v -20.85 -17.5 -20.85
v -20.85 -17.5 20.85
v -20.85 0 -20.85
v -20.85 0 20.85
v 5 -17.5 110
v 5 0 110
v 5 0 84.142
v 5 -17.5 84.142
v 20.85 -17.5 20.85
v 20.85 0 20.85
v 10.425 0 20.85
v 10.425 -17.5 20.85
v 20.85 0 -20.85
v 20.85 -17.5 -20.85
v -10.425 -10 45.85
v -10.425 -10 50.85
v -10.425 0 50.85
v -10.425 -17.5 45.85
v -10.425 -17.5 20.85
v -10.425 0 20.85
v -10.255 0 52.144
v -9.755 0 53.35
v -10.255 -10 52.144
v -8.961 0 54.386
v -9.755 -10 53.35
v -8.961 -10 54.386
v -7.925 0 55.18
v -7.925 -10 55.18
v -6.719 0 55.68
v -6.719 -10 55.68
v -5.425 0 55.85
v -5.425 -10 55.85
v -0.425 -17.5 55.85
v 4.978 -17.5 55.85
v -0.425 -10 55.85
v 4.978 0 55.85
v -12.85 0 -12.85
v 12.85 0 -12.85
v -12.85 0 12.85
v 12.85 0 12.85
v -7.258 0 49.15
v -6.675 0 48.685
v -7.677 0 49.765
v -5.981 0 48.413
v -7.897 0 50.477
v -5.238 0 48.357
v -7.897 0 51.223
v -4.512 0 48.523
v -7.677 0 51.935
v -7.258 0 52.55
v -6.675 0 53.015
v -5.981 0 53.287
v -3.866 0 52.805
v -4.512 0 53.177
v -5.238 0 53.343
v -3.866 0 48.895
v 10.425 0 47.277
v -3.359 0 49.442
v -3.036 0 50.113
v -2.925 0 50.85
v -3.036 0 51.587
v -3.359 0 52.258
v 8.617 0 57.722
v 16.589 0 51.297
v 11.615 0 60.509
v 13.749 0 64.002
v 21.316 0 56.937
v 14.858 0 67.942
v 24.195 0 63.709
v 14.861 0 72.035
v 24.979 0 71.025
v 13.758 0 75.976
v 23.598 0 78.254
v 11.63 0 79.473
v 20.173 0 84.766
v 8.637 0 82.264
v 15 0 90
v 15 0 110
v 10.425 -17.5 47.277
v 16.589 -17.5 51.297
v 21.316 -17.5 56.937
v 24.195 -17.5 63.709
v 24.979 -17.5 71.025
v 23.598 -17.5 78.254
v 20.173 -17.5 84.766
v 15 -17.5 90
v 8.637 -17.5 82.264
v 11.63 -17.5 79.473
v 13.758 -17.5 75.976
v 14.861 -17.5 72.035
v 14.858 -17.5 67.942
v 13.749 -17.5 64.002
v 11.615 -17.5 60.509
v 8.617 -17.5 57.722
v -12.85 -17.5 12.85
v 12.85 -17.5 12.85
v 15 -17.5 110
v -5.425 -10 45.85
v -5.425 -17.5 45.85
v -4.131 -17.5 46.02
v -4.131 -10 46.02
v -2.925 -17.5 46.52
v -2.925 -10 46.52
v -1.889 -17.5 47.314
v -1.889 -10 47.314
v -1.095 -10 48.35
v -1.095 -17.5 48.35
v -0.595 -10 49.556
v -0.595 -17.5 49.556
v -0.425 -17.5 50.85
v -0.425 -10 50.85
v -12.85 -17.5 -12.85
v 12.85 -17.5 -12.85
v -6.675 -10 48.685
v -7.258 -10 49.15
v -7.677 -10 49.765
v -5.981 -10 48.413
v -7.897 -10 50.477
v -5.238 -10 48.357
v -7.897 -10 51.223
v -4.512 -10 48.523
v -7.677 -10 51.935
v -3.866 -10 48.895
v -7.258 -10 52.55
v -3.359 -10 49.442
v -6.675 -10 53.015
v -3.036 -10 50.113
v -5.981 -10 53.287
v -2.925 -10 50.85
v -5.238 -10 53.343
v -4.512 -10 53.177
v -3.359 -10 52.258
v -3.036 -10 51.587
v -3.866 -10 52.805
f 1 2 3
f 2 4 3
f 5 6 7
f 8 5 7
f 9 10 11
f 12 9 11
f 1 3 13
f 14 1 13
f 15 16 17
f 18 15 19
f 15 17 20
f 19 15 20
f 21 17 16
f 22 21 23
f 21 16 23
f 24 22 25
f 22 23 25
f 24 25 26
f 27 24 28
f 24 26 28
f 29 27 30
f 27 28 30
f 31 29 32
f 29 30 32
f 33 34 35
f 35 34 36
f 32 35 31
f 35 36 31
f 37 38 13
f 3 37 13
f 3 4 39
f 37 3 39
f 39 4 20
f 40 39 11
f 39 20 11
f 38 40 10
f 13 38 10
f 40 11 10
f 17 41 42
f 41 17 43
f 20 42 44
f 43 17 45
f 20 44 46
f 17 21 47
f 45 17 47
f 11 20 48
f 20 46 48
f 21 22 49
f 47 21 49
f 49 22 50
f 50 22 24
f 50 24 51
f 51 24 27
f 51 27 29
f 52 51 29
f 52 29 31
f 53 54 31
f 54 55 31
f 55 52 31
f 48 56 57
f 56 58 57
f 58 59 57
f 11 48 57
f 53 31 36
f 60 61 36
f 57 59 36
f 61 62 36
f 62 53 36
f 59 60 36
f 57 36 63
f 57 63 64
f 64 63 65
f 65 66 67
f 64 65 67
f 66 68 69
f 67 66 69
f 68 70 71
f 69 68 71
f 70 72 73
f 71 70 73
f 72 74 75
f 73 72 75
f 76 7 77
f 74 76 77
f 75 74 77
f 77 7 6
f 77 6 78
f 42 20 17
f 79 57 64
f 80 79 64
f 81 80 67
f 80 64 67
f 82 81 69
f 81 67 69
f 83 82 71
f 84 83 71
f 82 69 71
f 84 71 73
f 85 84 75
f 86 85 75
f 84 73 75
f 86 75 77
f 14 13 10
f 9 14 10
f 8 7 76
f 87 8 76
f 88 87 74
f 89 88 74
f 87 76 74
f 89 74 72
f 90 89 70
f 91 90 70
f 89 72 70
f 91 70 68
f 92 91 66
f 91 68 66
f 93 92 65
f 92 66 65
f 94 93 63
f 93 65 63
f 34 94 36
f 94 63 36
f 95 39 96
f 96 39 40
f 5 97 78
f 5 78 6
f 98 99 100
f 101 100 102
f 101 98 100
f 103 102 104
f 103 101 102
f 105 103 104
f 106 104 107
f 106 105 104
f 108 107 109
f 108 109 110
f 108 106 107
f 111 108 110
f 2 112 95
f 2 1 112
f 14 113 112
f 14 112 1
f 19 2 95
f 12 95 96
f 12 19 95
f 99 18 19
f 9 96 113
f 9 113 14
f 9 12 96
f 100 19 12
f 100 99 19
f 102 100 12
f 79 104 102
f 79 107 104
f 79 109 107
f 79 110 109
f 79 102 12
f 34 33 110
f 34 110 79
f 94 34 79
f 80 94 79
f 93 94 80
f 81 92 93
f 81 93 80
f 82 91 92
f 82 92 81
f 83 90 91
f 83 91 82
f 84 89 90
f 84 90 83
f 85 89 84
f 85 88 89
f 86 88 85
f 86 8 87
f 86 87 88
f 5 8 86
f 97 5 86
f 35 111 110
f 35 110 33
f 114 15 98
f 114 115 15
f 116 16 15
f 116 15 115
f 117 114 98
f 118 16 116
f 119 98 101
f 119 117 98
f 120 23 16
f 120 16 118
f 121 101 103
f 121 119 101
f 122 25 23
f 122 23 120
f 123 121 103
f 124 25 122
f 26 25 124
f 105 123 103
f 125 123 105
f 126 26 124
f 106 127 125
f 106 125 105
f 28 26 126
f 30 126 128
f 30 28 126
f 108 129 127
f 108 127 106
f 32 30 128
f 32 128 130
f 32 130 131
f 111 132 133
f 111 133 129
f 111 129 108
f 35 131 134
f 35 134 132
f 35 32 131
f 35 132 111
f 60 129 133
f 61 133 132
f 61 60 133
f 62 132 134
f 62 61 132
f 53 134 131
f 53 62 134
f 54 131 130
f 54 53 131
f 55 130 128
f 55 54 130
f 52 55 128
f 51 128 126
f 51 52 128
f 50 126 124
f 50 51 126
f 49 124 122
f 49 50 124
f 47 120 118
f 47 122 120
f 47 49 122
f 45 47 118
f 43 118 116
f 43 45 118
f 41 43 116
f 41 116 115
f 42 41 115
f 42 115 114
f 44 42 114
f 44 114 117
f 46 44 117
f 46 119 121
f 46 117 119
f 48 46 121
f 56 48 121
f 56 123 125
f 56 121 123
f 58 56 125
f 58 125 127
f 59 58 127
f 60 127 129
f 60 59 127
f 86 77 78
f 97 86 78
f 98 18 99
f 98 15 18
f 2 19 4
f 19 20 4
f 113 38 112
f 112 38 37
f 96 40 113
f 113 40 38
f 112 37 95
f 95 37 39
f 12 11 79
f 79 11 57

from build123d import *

# Parameters (mm, degrees)
F0_R     = 2.5
F1_DEPTH = 15
F2_R     = 5
F4_DEPTH = 5
F5_DEPTH = 2.5


with BuildPart() as f1:
    # F0 (on Front) → F1 (new body)
    with BuildSketch(Plane.XZ):
        with BuildLine():
            Line((-20.85, 20.85), (-20.85, 0))
            Line((-20.85, 0), (-20.85, -20.85))
            Line((-20.85, -20.85), (0, -20.85))
            Line((0, -20.85), (20.85, -20.85))
            Line((20.85, -20.85), (20.85, 0))
            Line((20.85, 0), (20.85, 20.85))
            Line((20.85, 20.85), (10.425, 20.85))
            Line((10.425, 20.85), (10.425, 47.277337854))
            ThreePointArc((10.425, 47.277337854), (24.8578784585, 67.3380686447), (15, 90))
            Line((15, 90), (15, 110))
            Line((15, 110), (5, 110))
            Line((5, 110), (5, 84.1421356237))
            ThreePointArc((5, 84.1421356237), (14.9999953406, 69.9881770745), (4.9777002722, 55.85))
            Line((4.9777002722, 55.85), (-10.425, 55.85))
            Line((-10.425, 55.85), (-10.425, 20.85))
            Line((-10.425, 20.85), (-20.85, 20.85))
        make_face()
        Polygon((-12.85, 12.85), (0, 12.85), (12.85, 12.85), (12.85, 0), (12.85, -12.85), (0, -12.85), (-12.85, -12.85), (-12.85, 0), align=None, mode=Mode.SUBTRACT)
        with Locations((-5.425, 50.85)):
            Circle(F0_R, mode=Mode.SUBTRACT)
    extrude(amount=F1_DEPTH)

    # F2
    f2_edges = [f1.edges().sort_by_distance(p)[0] for p in [
        (-10.425, -7.5, 55.85),
    ]]
    fillet(f2_edges, radius=F2_R)

    # F3 (on face) → F4 (cut)
    with BuildSketch(Plane.XZ.offset(15)):
        with BuildLine():
            Line((-0.425, 55.85), (-5.425, 55.85))
            ThreePointArc((-5.425, 55.85), (-8.9605339059, 54.3855339059), (-10.425, 50.85))
            Line((-10.425, 50.85), (-10.425, 45.85))
            Line((-10.425, 45.85), (-5.425, 45.85))
            ThreePointArc((-5.425, 45.85), (-1.8894660941, 47.3144660941), (-0.425, 50.85))
            Line((-0.425, 50.85), (-0.425, 55.85))
        make_face()
    extrude(amount=-F4_DEPTH, mode=Mode.SUBTRACT)

    # F5 (add): a face of the model
    f5_faces = [f1.faces().sort_by_distance(p)[0] for p in [
        (4.1569852553, -15, 31.7276341026),
    ]]
    extrude(f5_faces, amount=F5_DEPTH)


solid = f1.part
